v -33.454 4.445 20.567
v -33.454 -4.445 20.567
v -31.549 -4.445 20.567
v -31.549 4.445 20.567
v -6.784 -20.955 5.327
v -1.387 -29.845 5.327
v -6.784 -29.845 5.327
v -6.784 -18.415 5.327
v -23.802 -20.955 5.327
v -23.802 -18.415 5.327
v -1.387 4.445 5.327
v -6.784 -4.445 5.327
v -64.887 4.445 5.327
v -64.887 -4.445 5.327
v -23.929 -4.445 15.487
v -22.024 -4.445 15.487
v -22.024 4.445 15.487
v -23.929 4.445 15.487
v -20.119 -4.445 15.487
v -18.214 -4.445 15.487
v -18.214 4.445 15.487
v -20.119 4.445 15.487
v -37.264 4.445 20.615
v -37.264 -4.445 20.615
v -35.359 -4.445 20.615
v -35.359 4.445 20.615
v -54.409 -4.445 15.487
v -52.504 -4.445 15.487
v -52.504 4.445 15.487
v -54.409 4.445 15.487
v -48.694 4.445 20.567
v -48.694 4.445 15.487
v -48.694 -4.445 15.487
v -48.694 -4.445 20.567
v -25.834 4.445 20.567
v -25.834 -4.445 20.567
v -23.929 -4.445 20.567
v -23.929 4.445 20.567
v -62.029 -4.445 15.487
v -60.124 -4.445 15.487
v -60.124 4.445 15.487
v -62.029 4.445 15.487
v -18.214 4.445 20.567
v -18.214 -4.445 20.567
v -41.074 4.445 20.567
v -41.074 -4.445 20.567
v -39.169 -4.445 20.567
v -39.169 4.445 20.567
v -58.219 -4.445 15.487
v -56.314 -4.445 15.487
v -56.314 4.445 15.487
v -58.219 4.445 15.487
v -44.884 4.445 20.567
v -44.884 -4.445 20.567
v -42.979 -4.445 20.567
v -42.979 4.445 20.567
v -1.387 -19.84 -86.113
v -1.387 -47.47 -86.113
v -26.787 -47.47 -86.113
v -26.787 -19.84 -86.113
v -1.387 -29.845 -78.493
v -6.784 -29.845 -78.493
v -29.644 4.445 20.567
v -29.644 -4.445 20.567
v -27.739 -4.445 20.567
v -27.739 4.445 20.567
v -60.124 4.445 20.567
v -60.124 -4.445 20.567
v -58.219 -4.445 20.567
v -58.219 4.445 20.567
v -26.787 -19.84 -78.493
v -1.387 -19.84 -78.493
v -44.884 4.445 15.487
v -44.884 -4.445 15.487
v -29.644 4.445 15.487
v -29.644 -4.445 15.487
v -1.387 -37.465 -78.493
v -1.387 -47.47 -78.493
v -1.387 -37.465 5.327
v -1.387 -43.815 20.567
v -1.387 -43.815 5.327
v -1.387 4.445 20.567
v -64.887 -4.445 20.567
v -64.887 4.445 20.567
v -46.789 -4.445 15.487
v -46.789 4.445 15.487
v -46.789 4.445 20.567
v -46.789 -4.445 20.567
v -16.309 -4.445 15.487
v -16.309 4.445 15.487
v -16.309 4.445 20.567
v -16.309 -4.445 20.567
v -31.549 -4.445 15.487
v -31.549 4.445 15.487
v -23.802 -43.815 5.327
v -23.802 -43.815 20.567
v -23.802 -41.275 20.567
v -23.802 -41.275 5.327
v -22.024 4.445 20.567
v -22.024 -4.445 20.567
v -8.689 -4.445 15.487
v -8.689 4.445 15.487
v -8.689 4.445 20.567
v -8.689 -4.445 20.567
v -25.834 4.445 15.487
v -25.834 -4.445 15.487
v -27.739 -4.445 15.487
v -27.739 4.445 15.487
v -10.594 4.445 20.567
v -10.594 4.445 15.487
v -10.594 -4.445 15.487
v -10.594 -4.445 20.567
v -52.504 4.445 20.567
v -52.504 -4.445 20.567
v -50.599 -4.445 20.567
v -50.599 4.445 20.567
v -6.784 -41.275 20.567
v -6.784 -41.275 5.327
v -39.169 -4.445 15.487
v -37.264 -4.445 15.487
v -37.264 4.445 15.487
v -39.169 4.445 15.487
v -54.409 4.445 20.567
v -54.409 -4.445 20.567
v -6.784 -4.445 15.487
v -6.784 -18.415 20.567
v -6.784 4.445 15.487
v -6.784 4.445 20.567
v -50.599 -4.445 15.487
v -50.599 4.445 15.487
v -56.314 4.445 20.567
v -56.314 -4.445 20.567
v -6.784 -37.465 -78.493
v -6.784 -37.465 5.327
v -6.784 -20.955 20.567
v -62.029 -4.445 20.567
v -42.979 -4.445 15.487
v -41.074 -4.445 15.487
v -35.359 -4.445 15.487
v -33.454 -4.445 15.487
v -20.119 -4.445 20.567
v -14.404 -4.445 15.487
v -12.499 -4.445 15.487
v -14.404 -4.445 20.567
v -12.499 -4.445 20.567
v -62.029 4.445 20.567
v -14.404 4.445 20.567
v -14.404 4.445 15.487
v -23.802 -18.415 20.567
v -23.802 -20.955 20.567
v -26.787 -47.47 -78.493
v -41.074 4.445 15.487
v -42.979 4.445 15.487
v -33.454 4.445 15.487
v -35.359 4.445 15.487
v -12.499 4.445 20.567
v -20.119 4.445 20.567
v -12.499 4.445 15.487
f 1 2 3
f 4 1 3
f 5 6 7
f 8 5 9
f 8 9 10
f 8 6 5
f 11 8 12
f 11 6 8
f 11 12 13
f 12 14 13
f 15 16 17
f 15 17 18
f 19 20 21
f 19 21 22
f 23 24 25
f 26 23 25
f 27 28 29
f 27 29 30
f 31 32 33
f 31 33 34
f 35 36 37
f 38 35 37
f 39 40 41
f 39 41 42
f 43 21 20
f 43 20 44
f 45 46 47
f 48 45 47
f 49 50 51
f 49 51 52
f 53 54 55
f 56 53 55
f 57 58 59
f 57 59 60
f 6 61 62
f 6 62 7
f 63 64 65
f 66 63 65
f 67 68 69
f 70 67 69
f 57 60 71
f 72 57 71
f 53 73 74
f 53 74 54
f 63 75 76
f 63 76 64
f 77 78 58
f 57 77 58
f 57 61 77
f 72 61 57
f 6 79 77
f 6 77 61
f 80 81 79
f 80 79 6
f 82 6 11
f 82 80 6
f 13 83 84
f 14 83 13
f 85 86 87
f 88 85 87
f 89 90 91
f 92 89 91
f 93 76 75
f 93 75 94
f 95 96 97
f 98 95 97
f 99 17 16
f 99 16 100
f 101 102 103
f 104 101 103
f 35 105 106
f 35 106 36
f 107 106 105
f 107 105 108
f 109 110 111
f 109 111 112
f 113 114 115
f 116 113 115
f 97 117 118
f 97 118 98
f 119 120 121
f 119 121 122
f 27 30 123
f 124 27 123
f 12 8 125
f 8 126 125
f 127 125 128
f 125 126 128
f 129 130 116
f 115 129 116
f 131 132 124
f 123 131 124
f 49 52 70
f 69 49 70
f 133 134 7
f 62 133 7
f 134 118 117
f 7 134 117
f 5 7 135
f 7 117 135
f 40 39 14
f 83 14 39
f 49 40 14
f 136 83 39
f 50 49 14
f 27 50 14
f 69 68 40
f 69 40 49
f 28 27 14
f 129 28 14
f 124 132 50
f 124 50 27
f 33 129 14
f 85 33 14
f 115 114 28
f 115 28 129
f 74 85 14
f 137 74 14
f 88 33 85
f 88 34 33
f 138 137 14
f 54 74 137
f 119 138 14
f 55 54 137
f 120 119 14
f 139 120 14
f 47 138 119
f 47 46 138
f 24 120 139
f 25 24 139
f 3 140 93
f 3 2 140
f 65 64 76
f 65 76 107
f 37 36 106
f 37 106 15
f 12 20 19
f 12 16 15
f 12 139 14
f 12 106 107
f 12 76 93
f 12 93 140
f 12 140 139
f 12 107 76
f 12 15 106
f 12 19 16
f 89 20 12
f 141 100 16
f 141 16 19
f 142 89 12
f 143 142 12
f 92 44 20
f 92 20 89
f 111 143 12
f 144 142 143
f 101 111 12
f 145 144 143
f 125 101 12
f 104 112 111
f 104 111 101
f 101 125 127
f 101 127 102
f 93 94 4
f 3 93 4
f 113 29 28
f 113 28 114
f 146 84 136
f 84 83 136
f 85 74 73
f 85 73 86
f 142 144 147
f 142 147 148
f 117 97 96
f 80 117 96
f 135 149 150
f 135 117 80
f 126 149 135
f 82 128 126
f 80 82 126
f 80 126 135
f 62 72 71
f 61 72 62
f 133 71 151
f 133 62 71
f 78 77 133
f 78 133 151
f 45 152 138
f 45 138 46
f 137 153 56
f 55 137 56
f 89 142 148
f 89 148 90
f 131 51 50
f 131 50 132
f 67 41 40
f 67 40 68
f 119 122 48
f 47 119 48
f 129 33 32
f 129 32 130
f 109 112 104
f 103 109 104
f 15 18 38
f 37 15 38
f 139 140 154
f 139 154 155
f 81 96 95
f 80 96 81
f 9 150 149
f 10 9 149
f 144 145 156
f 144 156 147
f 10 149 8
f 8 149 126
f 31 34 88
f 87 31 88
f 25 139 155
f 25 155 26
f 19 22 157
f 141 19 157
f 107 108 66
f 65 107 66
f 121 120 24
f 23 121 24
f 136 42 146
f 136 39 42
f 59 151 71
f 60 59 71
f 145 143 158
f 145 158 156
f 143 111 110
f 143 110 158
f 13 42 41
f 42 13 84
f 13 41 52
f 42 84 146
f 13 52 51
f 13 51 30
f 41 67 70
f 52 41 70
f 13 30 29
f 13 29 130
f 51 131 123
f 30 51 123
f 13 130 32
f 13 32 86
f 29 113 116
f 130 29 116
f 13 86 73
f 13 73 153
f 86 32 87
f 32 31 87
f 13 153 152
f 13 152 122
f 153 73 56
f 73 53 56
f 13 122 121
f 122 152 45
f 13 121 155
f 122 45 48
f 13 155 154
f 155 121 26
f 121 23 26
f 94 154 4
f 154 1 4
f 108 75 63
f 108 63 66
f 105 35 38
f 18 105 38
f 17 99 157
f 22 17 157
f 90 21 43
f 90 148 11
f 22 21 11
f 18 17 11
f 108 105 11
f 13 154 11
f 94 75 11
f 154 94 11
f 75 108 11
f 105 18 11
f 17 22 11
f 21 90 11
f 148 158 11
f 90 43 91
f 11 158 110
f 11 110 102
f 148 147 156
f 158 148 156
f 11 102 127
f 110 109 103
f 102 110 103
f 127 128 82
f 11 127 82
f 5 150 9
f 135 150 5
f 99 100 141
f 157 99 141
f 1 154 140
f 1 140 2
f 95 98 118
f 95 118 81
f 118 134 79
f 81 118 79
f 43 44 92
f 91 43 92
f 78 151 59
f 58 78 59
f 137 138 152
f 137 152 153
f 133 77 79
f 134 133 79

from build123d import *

# Parameters (mm, degrees)
F0_W     = 2.8575
F0_H     = 5.08
F0_W_2   = 1.905
F0_W_3   = 5.3975
F0_H_2   = 5.128411484
F1_DEPTH = 4.445
F2_W     = 7.62
F2_H     = 83.82
F3_DEPTH = 5.3975
F4_W     = 17.018
F4_H     = 2.54
F4_W_2   = 2.45618
F4_W_3   = 14.56182
F5_DEPTH = 15.24
F6_DEPTH = 25.4


# Not quite as in the source:
# - a feature names something its author has since deleted; it is built from what else it names


with BuildPart() as f1:
    # F0 (on Front) → F1 (new body, symmetric)
    with BuildSketch(Plane.XZ):
        with Locations((-63.4578398415, 18.0266693214)):
            Rectangle(F0_W, F0_H)
        Polygon((-62.0290898415, 15.4866693214), (-64.8865898415, 15.4866693214), (-64.8865898415, 5.3266693214), (-1.3865898415, 5.3266693214), (-1.3865898415, 15.4866693214), (-6.7840898415, 15.4866693214), (-8.6890898415, 15.4866693214), (-10.5940898415, 15.4866693214), (-12.4990898415, 15.4866693214), (-13.314443469, 15.4866693214), (-14.4040898415, 15.4866693214), (-16.3090898415, 15.4866693214), (-18.2140898415, 15.4866693214), (-20.1190898415, 15.4866693214), (-22.0240898415, 15.4866693214), (-23.9290898415, 15.4866693214), (-25.8340898415, 15.4866693214), (-27.7390898415, 15.4866693214), (-29.6440898415, 15.4866693214), (-31.5490898415, 15.4866693214), (-33.4540898415, 15.4866693214), (-35.3590898415, 15.4866693214), (-37.2640898415, 15.4866693214), (-39.1690898415, 15.4866693214), (-41.0740898415, 15.4866693214), (-42.9790898415, 15.4866693214), (-44.8840898415, 15.4866693214), (-46.7890898415, 15.4866693214), (-48.6940898415, 15.4866693214), (-50.5990898415, 15.4866693214), (-52.5040898415, 15.4866693214), (-54.4090898415, 15.4866693214), (-56.3140898415, 15.4866693214), (-58.2190898415, 15.4866693214), (-60.1240898415, 15.4866693214), align=None)
        with Locations((-59.1715898415, 18.0266693214)):
            Rectangle(F0_W_2, F0_H)
        with Locations((-4.0853398415, 18.0266693214)):
            Rectangle(F0_W_3, F0_H)
        with Locations((-55.3615898415, 18.0266693214)):
            Rectangle(F0_W_2, F0_H)
        with Locations((-9.6415898415, 18.0266693214)):
            Rectangle(F0_W_2, F0_H)
        with Locations((-51.5515898415, 18.0266693214)):
            Rectangle(F0_W_2, F0_H)
        Polygon((-13.314443469, 15.4866693214), (-12.4990898415, 15.4866693214), (-12.4990898415, 20.5666693214), (-13.314443469, 20.5666693214), (-14.4040898415, 20.5666693214), (-14.4040898415, 15.4866693214), align=None)
        with Locations((-47.7415898415, 18.0266693214)):
            Rectangle(F0_W_2, F0_H)
        with Locations((-43.9315898415, 18.0266693214)):
            Rectangle(F0_W_2, F0_H)
        with Locations((-17.2615898415, 18.0266693214)):
            Rectangle(F0_W_2, F0_H)
        with Locations((-40.1215898415, 18.0266693214)):
            Rectangle(F0_W_2, F0_H)
        with Locations((-21.0715898415, 18.0266693214)):
            Rectangle(F0_W_2, F0_H)
        with Locations((-36.3115898415, 18.0508750634)):
            Rectangle(F0_W_2, F0_H_2)
        with Locations((-24.8815898415, 18.0266693214)):
            Rectangle(F0_W_2, F0_H)
        with Locations((-32.5015898415, 18.0266693214)):
            Rectangle(F0_W_2, F0_H)
        with Locations((-28.6915898415, 18.0266693214)):
            Rectangle(F0_W_2, F0_H)
    extrude(amount=F1_DEPTH, both=True)

    # F2 (on face) → F3 (join)
    with BuildSketch(Plane.YZ.offset(-1.3865898415)):
        Polygon((-4.445, 5.3266693214), (-4.445, 20.5666693214), (-43.815, 20.5666693214), (-43.815, 5.3266693214), (-37.465, 5.3266693214), (-29.845, 5.3266693214), align=None)
        with Locations((-33.655, -36.5833306786)):
            Rectangle(F2_W, F2_H)
    extrude(amount=-F3_DEPTH)

    # F4 (on face) → F5 (join)
    with BuildSketch(Plane.XY.offset(20.5666693214)):
        with Locations((-15.2930898415, -19.685)):
            Rectangle(F4_W, F4_H)
        with Locations((-22.5739998415, -42.545)):
            Rectangle(F4_W_2, F4_H)
        with Locations((-14.0649998415, -42.545)):
            Rectangle(F4_W_3, F4_H)
    extrude(amount=-F5_DEPTH)

    # F2 (on face) → F6 (join)
    with BuildSketch(Plane.YZ.offset(-1.3865898415)):
        Polygon((-19.840323447, -78.4933306786), (-29.845, -78.4933306786), (-37.465, -78.4933306786), (-47.469676553, -78.4933306786), (-47.469676553, -86.1133306786), (-19.840323447, -86.1133306786), align=None)
    extrude(amount=-F6_DEPTH)


solid = f1.part
